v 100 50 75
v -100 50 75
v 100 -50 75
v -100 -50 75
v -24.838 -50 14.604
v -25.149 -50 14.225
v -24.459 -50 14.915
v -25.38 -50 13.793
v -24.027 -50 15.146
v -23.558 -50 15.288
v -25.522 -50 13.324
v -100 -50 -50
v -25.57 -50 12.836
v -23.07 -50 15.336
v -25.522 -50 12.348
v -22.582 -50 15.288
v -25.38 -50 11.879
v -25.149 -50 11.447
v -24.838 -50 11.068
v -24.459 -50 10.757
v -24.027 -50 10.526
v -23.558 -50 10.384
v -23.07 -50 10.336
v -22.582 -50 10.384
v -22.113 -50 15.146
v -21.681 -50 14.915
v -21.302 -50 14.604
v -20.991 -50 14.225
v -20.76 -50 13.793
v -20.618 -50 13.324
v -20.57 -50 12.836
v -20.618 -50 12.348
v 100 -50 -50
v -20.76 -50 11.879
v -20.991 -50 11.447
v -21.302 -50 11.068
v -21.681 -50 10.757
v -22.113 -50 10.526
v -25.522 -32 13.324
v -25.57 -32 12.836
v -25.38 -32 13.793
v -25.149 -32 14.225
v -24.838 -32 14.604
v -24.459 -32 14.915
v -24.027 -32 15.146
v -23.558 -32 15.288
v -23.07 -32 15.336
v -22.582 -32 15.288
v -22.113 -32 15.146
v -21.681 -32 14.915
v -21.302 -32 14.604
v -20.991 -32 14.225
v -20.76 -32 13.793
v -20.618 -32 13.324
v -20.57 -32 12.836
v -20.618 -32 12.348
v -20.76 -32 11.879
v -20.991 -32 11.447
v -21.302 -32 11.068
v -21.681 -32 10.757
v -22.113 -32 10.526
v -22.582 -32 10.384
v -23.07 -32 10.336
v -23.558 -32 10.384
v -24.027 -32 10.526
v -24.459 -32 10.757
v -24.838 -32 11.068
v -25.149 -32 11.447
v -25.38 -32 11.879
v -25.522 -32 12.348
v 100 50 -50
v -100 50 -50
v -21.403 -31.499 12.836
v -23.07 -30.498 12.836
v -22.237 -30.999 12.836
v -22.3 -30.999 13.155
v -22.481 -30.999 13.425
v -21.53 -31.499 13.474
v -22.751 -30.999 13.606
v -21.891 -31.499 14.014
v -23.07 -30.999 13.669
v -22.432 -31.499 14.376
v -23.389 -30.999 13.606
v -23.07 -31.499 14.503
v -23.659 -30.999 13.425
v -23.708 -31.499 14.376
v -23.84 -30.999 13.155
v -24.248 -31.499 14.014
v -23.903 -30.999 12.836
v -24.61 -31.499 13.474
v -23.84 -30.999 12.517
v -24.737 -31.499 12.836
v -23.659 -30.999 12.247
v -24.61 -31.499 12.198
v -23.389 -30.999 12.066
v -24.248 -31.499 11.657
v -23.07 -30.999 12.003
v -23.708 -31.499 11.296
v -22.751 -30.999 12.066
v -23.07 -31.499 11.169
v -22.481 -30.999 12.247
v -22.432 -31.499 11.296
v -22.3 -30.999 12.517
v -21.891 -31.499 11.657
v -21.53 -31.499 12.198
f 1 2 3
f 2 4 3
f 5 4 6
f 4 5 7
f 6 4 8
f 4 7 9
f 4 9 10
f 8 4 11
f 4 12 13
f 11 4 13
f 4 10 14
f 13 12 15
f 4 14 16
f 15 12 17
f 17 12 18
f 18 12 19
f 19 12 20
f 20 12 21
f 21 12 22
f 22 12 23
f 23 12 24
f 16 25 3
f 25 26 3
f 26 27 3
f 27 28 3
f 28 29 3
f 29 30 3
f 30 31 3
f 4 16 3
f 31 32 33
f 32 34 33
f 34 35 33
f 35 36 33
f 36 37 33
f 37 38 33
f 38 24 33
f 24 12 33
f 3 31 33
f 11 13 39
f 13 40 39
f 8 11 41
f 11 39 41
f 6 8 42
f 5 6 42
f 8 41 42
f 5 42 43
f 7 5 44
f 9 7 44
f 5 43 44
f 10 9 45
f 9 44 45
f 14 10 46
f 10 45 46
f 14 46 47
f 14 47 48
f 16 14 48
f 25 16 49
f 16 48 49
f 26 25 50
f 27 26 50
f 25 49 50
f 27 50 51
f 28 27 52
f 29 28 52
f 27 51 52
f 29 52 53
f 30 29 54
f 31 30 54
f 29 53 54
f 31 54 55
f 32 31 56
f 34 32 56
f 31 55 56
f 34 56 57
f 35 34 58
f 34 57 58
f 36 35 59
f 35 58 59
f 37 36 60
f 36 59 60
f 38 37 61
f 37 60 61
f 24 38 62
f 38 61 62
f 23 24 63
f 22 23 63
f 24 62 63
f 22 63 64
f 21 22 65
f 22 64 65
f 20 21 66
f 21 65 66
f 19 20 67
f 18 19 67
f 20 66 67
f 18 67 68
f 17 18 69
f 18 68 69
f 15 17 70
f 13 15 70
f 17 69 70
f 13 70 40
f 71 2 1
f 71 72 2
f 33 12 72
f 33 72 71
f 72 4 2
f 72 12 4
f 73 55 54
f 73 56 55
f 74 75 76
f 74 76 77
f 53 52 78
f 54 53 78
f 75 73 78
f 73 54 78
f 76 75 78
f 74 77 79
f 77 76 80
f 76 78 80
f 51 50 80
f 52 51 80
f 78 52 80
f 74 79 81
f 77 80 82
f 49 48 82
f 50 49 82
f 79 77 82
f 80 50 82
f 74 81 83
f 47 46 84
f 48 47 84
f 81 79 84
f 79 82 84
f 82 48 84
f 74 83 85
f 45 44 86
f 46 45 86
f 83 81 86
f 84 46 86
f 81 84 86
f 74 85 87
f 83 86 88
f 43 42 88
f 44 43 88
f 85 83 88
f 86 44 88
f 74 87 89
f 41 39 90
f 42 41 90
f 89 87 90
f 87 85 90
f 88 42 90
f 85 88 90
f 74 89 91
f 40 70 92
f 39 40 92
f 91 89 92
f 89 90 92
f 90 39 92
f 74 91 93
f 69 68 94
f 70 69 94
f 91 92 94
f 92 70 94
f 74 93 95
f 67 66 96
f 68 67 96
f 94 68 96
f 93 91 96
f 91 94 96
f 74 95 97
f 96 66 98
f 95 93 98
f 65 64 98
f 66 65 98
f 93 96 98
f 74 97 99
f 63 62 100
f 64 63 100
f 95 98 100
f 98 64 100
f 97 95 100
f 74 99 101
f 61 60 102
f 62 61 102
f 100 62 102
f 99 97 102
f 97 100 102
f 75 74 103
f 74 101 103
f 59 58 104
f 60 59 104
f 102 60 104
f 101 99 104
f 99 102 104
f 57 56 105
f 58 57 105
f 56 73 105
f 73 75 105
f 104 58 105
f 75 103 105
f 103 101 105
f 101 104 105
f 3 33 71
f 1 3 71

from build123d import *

# Parameters (mm, degrees)
F0_W     = 200
F0_H     = 100
F1_DEPTH = 50
F3_D     = 5
F3_DEPTH = 18
F3_TIP   = 1.5021515476
F4_DEPTH = 25


with BuildPart() as f1:
    # F0 (on Front) → F1 (new body, symmetric)
    with BuildSketch(Plane.XZ):
        Rectangle(F0_W, F0_H)
    extrude(amount=F1_DEPTH, both=True)

    # F3
    with Locations(Plane.XZ.offset(50)):
        with Locations((-23.0699349195, 12.8359030932)):
            Hole(F3_D / 2, depth=F3_DEPTH)
            with Locations((0, 0, -(F3_DEPTH + F3_TIP / 2))):  # 118° drill point
                Cone(0, F3_D / 2, F3_TIP, mode=Mode.SUBTRACT)

    # F4 (add): a face of the model
    f4_faces = [f1.faces().sort_by_distance(p)[0] for p in [
        (0, 0, 50),
    ]]
    extrude(f4_faces, amount=F4_DEPTH)


solid = f1.part
